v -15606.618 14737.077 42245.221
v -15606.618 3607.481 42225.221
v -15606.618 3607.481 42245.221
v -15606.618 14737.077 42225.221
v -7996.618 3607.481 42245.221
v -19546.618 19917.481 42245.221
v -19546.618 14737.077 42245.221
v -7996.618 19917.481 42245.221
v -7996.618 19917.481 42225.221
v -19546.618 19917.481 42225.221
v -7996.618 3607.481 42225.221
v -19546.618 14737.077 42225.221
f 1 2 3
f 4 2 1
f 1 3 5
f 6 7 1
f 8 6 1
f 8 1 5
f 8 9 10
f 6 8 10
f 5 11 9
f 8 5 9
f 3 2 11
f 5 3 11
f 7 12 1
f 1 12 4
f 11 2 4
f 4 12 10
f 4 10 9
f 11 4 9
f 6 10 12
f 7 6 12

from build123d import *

# Parameters (mm, degrees)
SKETCH1_W           = 7610
SKETCH1_H           = 11129.596
BOSS_EXTRUDE1_DEPTH = 20


with BuildPart() as part:
    # Sketch1 → Boss-Extrude1 (new body)
    with BuildSketch(Plane.XY.offset(42225.220842973)):
        Polygon((-7996.617683291, 14737.077366586), (-7996.617683291, 19917.481366586), (-19546.617683291, 19917.481366586), (-19546.617683291, 14737.077366586), (-15606.617683291, 14737.077366586), align=None)
        with Locations((-11801.617683291, 9172.279366586)):
            Rectangle(SKETCH1_W, SKETCH1_H)
    extrude(amount=BOSS_EXTRUDE1_DEPTH)


solid = part.part
